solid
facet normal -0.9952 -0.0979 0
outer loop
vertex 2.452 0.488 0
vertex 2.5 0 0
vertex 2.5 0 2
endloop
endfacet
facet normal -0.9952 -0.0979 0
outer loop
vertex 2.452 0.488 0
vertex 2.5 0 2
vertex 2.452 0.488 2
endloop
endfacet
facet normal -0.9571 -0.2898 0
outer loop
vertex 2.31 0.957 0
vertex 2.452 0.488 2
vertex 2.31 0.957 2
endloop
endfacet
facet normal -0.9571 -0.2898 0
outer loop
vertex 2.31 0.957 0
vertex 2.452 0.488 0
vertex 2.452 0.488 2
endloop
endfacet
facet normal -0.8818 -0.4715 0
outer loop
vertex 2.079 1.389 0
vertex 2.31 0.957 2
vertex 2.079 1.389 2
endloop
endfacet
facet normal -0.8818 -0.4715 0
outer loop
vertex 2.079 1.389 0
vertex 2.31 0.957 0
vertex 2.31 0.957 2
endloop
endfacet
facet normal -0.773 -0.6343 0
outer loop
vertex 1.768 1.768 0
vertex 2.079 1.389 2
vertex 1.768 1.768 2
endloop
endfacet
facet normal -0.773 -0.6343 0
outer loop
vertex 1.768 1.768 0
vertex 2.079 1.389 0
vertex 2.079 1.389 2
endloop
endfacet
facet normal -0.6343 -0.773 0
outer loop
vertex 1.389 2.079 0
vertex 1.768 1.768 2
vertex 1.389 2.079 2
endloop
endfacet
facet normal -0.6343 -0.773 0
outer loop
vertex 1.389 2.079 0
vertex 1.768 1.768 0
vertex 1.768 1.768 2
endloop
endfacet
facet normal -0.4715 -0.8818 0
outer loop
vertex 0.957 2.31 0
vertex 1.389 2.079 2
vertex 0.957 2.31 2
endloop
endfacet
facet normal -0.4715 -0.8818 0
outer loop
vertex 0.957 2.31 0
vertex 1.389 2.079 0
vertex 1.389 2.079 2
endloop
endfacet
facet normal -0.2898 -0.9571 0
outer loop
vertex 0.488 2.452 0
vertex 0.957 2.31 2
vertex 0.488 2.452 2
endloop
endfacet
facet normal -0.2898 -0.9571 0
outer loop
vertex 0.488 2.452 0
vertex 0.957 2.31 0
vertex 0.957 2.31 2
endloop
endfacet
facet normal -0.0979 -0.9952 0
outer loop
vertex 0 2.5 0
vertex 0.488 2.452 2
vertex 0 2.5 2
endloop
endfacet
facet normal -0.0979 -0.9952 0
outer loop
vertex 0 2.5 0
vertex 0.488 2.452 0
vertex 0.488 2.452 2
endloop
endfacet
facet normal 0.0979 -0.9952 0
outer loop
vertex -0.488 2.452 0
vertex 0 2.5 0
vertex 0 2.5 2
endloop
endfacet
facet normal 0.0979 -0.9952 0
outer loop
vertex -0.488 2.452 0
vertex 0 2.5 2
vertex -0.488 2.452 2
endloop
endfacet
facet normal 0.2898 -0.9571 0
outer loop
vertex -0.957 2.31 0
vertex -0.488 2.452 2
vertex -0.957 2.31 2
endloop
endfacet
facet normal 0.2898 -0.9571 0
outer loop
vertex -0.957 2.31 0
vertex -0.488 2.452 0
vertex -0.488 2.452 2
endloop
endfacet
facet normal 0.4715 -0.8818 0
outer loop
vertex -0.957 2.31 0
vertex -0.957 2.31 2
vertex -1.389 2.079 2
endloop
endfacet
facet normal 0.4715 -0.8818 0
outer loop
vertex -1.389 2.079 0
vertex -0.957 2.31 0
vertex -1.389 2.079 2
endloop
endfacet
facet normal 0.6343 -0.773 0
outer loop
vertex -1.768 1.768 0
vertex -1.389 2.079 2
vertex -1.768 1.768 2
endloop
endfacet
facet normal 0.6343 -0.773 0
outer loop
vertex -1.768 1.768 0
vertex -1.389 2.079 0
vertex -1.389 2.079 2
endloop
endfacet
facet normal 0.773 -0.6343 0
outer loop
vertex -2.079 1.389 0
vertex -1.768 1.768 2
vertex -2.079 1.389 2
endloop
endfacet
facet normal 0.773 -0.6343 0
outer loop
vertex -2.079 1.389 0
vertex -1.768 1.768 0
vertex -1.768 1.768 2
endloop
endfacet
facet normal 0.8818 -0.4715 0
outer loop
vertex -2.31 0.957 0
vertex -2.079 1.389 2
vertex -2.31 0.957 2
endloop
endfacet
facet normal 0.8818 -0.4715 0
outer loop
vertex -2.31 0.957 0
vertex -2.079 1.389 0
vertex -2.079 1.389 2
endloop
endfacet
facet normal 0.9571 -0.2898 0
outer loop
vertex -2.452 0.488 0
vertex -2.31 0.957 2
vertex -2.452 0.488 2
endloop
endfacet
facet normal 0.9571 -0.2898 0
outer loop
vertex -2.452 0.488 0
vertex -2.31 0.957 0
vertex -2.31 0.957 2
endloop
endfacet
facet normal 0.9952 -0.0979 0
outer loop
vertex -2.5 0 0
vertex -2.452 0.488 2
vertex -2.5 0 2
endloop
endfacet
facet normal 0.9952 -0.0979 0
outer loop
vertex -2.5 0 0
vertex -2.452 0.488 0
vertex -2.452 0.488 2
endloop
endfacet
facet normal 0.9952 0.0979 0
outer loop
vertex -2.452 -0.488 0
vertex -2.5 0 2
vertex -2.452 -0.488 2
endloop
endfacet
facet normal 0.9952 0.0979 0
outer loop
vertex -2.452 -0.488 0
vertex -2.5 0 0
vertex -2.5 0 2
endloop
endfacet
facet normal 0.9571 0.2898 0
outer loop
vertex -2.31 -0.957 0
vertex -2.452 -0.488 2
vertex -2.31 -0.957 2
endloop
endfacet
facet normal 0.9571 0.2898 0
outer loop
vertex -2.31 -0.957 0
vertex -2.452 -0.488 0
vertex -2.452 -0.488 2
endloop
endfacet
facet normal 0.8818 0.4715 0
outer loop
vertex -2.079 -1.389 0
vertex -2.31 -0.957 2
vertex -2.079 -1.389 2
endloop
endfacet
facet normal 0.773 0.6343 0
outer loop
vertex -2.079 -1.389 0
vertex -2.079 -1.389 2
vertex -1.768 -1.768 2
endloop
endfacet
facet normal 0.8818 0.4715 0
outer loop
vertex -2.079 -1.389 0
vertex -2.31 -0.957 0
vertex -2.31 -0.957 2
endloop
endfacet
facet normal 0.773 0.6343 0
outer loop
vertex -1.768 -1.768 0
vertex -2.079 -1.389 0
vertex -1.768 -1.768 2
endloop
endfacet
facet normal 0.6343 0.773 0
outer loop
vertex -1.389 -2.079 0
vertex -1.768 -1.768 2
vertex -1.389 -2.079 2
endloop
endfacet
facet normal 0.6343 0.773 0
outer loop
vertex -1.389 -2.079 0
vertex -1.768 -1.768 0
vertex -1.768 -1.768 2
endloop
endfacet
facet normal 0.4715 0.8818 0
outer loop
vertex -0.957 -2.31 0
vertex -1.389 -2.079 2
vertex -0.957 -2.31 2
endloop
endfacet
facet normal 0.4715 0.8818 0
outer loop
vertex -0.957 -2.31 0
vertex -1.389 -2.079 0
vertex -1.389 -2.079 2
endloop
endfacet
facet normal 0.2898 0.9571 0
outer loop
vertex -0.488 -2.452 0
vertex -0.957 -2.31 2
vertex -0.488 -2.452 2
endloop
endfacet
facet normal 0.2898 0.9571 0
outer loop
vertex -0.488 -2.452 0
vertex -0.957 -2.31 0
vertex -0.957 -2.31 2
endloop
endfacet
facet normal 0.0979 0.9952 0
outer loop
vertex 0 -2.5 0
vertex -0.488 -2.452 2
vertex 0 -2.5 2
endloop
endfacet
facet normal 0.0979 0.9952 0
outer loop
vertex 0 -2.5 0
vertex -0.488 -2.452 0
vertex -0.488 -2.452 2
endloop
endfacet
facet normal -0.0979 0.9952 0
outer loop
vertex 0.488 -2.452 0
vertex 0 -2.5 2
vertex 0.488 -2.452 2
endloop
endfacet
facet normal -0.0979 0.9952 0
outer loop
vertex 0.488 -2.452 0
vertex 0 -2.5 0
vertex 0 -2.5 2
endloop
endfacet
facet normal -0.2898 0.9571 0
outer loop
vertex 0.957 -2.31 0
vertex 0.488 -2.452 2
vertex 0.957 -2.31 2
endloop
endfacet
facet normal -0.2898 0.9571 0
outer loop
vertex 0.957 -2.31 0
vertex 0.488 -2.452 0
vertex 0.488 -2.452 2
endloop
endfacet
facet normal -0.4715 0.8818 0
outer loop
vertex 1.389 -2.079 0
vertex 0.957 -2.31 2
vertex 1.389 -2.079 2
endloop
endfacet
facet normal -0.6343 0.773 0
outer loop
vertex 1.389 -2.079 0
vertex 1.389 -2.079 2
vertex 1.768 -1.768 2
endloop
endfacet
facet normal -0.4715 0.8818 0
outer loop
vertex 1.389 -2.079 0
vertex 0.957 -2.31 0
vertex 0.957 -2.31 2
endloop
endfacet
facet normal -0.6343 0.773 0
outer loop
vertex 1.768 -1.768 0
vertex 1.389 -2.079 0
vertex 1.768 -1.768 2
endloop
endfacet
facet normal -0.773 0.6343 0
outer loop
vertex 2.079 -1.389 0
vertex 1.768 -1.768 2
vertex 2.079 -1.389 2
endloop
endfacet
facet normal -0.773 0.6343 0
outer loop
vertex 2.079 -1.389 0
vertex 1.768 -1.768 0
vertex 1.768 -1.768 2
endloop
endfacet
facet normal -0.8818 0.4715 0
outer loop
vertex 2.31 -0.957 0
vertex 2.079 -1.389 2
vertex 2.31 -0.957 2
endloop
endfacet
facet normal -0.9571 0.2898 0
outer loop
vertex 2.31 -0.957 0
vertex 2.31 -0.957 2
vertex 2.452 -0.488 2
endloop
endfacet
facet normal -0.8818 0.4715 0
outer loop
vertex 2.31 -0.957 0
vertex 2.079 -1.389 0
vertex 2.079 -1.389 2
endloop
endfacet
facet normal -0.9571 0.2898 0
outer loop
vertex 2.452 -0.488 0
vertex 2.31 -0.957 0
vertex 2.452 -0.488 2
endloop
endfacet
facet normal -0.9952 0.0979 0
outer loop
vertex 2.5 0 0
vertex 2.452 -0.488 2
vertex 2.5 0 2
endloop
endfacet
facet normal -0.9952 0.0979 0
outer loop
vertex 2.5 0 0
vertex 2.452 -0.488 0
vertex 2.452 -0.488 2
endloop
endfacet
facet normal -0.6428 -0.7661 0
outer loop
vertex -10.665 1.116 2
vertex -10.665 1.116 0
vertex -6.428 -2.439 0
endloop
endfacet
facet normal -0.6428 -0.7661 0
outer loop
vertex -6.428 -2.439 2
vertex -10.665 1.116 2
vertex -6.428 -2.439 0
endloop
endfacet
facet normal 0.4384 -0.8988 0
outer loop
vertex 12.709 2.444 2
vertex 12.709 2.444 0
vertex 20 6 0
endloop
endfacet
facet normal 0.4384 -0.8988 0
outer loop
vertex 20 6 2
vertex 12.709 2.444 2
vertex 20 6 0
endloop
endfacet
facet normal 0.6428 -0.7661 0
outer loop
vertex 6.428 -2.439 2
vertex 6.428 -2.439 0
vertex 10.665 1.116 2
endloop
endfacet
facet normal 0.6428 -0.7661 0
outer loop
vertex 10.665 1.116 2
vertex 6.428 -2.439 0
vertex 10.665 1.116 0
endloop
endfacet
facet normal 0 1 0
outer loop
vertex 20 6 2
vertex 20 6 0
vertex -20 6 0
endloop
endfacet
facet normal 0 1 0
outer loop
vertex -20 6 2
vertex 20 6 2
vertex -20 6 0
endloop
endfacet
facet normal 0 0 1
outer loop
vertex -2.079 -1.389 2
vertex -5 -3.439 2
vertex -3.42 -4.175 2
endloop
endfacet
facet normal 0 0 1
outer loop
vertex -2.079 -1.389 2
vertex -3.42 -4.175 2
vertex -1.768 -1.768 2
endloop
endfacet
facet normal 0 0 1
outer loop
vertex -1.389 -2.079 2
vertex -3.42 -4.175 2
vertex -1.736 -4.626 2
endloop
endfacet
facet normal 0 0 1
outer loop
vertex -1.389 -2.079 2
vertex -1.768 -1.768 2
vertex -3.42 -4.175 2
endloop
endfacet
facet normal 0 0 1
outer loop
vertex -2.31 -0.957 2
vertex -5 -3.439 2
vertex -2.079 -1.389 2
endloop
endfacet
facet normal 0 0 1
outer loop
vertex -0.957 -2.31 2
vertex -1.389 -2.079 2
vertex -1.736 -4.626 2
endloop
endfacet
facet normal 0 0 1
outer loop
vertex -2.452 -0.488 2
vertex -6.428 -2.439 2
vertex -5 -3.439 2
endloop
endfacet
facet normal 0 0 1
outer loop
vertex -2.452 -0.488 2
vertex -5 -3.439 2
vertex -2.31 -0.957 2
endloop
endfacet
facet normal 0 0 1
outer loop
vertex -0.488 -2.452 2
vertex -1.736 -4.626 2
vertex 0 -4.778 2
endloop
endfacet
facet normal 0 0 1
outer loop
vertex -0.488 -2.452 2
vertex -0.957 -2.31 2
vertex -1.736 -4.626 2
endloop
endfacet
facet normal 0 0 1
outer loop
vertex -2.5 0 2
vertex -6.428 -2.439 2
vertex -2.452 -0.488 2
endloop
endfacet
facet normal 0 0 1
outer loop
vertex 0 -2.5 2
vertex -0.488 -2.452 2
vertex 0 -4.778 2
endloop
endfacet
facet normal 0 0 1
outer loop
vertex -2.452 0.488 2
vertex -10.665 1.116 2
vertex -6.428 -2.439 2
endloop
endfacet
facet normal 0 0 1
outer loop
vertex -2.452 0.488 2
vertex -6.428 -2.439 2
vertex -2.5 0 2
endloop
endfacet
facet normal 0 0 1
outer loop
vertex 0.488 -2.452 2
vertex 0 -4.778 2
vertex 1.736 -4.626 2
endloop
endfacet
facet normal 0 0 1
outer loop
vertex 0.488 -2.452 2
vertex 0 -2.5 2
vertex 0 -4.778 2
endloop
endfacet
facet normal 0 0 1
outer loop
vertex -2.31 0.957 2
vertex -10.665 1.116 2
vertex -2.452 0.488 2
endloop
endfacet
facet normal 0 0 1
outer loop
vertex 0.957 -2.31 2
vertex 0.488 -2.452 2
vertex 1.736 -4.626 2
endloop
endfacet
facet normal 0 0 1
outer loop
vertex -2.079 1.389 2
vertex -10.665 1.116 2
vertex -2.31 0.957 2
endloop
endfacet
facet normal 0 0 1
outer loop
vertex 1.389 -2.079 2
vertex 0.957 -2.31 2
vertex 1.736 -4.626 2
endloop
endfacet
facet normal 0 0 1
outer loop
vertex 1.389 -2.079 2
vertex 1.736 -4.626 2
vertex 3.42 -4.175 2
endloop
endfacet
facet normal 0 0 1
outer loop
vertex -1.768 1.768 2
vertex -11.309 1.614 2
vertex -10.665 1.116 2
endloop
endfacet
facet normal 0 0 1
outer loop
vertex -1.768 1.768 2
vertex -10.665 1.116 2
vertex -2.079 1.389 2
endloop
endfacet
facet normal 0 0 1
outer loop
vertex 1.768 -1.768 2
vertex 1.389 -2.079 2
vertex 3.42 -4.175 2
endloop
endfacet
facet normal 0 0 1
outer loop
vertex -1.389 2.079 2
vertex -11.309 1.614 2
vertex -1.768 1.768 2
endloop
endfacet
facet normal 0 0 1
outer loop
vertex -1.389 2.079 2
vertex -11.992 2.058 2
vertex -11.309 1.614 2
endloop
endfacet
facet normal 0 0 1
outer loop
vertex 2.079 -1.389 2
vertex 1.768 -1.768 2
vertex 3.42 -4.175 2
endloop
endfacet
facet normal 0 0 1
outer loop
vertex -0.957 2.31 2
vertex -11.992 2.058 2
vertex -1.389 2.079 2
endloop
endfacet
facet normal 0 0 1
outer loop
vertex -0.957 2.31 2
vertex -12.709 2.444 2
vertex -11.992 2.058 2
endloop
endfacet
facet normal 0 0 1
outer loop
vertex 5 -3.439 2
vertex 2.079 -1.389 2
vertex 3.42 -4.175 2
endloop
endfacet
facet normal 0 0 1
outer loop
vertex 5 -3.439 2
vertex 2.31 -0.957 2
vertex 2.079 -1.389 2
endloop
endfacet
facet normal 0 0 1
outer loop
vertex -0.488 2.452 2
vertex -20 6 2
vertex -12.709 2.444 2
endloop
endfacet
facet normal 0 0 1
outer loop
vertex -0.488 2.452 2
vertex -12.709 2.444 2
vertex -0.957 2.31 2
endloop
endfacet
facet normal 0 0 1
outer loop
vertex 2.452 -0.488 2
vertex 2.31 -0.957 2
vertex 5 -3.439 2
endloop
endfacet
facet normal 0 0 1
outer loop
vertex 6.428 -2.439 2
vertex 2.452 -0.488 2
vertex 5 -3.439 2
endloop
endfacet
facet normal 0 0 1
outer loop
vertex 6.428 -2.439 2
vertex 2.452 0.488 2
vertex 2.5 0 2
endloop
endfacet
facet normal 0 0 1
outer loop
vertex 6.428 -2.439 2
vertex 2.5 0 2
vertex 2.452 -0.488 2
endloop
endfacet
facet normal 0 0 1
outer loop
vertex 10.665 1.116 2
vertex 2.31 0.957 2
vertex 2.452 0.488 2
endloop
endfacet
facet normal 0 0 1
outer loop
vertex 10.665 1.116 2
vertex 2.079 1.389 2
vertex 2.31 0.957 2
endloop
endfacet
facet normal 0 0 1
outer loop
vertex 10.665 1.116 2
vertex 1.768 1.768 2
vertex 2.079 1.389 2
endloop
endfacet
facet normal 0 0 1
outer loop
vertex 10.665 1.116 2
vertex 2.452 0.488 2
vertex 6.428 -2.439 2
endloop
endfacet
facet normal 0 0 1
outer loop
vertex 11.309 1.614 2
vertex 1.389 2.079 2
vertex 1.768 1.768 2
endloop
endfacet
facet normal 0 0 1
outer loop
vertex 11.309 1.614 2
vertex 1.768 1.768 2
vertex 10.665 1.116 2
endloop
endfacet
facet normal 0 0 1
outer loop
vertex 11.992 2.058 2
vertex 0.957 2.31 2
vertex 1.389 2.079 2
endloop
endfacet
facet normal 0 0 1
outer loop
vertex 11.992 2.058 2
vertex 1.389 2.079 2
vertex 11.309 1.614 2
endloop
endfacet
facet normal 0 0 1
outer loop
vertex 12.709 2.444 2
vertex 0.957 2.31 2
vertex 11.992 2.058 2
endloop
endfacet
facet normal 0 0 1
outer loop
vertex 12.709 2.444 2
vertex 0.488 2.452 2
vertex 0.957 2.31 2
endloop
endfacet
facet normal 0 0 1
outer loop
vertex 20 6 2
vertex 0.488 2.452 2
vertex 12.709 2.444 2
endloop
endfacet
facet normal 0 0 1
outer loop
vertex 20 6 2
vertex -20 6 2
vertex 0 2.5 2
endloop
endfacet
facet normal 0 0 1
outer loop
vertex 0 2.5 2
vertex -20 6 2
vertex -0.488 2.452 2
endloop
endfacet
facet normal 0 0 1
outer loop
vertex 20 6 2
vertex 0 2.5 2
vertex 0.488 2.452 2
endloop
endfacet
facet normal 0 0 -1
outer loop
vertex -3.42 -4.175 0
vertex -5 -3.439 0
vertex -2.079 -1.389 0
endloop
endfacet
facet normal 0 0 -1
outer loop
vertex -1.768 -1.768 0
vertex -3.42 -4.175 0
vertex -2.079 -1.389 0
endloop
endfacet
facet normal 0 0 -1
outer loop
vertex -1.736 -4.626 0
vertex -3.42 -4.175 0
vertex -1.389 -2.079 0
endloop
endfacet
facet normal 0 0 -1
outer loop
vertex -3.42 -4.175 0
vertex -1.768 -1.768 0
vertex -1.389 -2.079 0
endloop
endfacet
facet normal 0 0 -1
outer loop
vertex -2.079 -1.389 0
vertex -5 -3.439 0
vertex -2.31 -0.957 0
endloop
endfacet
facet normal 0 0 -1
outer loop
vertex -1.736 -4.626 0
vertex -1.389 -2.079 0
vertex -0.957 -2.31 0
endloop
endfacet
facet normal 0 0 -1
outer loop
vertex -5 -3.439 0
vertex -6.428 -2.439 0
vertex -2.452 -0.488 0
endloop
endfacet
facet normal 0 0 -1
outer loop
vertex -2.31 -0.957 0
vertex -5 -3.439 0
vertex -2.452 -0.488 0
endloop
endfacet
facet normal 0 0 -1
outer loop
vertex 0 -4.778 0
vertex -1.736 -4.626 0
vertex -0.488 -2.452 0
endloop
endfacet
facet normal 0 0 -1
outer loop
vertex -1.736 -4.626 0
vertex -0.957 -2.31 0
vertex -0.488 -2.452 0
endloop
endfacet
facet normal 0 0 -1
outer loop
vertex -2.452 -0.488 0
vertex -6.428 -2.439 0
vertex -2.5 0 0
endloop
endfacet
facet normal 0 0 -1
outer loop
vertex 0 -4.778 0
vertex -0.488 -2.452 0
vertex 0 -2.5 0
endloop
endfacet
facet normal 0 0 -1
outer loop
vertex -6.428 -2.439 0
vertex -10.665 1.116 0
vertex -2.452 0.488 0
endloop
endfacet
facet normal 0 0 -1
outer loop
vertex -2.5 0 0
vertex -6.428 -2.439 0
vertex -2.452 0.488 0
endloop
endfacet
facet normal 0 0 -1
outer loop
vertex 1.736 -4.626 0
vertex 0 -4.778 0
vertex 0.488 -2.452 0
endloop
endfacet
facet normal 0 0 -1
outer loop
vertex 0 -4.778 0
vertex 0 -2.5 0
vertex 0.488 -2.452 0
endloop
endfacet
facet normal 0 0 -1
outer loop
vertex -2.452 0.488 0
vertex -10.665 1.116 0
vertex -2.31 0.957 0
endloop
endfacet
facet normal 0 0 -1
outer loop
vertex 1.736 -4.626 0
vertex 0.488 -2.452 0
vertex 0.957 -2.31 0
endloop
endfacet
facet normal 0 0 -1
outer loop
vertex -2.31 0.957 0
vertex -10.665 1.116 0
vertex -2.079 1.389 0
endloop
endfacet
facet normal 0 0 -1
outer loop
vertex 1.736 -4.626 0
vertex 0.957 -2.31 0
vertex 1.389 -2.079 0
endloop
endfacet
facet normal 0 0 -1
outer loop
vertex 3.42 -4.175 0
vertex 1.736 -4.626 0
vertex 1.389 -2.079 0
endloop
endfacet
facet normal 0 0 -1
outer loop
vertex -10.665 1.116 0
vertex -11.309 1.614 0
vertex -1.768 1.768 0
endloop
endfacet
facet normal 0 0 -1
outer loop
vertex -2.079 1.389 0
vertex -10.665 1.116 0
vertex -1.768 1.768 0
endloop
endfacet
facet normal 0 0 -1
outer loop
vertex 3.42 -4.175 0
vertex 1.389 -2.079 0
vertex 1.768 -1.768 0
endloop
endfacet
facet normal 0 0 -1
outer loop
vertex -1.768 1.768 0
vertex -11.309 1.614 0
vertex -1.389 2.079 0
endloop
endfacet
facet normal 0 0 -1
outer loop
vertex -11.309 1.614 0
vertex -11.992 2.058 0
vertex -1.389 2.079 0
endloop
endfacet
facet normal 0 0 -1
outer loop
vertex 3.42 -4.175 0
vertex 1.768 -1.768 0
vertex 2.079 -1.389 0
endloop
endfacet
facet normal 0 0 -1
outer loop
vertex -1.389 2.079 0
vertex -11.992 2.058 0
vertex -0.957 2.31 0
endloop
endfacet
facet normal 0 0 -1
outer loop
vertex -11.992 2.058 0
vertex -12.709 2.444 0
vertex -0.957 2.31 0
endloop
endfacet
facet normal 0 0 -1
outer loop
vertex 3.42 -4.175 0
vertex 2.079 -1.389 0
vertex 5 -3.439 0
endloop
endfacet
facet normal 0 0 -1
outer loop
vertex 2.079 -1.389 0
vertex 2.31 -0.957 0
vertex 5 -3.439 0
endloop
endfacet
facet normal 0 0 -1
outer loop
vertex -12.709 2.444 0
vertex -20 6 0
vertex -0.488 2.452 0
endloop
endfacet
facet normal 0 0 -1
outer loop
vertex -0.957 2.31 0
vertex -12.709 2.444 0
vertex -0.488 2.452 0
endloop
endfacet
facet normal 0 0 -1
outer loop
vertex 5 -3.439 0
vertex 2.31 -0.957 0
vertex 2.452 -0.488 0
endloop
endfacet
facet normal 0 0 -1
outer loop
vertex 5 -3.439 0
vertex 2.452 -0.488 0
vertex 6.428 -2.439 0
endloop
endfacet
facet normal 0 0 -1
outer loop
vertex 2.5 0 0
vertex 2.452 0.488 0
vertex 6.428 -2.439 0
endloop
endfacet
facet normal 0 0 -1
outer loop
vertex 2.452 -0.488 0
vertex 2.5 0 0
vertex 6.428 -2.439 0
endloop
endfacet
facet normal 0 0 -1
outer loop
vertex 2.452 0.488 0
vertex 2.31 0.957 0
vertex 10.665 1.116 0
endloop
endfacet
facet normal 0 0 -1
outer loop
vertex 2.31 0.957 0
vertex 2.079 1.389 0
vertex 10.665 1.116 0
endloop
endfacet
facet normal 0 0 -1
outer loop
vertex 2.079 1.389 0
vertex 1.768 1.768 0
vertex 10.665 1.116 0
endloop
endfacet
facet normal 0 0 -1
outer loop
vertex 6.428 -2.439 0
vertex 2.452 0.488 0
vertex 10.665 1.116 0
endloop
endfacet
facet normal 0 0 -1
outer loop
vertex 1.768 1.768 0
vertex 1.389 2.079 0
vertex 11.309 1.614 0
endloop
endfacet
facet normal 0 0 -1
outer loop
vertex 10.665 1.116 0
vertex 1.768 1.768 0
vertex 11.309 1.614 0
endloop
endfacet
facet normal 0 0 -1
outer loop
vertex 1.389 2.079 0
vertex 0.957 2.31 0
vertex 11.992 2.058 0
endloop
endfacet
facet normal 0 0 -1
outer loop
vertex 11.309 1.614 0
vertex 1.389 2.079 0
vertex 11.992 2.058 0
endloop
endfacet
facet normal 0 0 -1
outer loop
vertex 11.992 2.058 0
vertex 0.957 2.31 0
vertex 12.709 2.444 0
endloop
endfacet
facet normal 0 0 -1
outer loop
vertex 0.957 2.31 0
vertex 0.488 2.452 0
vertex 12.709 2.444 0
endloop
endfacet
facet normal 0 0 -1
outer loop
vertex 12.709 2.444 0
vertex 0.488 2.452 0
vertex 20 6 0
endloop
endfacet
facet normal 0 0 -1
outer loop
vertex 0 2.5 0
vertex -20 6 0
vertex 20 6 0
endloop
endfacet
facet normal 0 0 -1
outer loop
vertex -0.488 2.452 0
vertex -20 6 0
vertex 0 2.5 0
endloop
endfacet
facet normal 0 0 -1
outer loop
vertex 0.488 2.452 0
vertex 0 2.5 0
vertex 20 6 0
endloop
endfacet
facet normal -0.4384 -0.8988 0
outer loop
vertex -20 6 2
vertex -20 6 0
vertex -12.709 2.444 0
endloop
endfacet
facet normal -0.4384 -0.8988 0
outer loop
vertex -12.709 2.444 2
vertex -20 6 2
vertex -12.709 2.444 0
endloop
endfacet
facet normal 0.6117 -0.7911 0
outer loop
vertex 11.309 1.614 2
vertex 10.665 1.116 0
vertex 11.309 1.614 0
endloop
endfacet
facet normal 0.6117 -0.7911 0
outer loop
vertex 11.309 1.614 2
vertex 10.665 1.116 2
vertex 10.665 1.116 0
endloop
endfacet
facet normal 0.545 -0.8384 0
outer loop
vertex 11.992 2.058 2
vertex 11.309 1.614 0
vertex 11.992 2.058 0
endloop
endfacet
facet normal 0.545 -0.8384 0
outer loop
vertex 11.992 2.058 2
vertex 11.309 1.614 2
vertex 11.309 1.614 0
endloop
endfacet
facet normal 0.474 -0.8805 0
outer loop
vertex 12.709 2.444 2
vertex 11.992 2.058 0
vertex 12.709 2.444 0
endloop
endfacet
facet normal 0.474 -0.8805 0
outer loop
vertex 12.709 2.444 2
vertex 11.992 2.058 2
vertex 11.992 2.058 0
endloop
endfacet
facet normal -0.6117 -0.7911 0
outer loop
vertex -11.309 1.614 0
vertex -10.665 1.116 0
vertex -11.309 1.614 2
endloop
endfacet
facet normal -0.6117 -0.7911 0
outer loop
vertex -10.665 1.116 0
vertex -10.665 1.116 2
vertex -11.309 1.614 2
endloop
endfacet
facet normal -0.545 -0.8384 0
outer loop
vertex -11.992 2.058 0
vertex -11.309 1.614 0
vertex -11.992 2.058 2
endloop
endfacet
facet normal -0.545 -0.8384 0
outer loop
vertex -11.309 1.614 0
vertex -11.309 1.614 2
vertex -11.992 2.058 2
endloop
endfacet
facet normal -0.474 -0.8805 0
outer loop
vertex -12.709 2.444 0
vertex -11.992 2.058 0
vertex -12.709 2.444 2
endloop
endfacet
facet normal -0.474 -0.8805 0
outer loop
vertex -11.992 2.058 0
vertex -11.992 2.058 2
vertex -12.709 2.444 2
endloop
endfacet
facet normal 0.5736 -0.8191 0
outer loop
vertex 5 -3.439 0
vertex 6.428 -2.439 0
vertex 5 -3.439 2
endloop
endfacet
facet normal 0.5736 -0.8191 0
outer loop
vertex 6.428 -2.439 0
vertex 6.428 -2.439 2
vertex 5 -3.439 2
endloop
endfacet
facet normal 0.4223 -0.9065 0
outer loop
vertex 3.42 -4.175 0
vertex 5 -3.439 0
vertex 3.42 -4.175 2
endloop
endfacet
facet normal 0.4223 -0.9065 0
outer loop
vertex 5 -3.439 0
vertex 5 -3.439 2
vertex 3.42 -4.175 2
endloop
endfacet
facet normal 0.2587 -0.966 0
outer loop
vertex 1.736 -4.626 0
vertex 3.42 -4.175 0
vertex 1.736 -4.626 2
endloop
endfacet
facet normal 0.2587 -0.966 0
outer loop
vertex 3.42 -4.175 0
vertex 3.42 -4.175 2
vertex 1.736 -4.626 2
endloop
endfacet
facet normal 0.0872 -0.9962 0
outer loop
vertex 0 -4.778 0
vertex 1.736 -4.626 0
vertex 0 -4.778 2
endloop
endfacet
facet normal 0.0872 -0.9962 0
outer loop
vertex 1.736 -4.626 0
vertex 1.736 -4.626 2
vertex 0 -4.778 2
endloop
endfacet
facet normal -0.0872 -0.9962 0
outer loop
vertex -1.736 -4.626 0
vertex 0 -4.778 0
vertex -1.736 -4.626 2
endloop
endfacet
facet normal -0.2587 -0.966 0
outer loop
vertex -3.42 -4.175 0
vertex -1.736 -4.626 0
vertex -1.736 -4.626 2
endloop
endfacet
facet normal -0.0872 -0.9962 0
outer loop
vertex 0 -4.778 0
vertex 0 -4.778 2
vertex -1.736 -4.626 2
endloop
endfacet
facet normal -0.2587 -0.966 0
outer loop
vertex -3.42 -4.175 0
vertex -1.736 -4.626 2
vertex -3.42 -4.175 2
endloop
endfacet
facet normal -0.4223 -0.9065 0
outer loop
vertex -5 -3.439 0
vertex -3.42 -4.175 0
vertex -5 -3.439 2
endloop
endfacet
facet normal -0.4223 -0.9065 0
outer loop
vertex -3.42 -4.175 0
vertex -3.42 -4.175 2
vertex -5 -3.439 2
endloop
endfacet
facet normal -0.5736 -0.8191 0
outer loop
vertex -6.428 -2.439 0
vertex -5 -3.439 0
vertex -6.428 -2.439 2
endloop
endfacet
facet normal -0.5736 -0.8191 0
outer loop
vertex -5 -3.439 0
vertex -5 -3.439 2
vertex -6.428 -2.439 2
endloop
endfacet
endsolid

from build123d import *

# Parameters (mm, degrees)
SKETCH_1_R      = 2.5
EXTRUDE_1_DEPTH = 2
FILLET_1_R      = 10


with BuildPart() as part:
    # ｽｹｯﾁ1 → ﾎﾞｽ - 押し出し1 (new body)
    with BuildSketch(Plane.XY):
        Polygon((0, -7.832443736), (11.605504985, 1.905731217), (20, 6), (-20, 6), (-11.605504985, 1.905731217), align=None)
        Circle(SKETCH_1_R, mode=Mode.SUBTRACT)
    extrude(amount=EXTRUDE_1_DEPTH)

    # ﾌｨﾚｯﾄ1
    fillet_1_edges = [part.edges().sort_by_distance(p)[0] for p in [
        (-11.605504985, 1.905731217, 1),
        (11.605504985, 1.905731217, 1),
        (0, -7.832443736, 1),
    ]]
    fillet(fillet_1_edges, radius=FILLET_1_R)


solid = part.part
